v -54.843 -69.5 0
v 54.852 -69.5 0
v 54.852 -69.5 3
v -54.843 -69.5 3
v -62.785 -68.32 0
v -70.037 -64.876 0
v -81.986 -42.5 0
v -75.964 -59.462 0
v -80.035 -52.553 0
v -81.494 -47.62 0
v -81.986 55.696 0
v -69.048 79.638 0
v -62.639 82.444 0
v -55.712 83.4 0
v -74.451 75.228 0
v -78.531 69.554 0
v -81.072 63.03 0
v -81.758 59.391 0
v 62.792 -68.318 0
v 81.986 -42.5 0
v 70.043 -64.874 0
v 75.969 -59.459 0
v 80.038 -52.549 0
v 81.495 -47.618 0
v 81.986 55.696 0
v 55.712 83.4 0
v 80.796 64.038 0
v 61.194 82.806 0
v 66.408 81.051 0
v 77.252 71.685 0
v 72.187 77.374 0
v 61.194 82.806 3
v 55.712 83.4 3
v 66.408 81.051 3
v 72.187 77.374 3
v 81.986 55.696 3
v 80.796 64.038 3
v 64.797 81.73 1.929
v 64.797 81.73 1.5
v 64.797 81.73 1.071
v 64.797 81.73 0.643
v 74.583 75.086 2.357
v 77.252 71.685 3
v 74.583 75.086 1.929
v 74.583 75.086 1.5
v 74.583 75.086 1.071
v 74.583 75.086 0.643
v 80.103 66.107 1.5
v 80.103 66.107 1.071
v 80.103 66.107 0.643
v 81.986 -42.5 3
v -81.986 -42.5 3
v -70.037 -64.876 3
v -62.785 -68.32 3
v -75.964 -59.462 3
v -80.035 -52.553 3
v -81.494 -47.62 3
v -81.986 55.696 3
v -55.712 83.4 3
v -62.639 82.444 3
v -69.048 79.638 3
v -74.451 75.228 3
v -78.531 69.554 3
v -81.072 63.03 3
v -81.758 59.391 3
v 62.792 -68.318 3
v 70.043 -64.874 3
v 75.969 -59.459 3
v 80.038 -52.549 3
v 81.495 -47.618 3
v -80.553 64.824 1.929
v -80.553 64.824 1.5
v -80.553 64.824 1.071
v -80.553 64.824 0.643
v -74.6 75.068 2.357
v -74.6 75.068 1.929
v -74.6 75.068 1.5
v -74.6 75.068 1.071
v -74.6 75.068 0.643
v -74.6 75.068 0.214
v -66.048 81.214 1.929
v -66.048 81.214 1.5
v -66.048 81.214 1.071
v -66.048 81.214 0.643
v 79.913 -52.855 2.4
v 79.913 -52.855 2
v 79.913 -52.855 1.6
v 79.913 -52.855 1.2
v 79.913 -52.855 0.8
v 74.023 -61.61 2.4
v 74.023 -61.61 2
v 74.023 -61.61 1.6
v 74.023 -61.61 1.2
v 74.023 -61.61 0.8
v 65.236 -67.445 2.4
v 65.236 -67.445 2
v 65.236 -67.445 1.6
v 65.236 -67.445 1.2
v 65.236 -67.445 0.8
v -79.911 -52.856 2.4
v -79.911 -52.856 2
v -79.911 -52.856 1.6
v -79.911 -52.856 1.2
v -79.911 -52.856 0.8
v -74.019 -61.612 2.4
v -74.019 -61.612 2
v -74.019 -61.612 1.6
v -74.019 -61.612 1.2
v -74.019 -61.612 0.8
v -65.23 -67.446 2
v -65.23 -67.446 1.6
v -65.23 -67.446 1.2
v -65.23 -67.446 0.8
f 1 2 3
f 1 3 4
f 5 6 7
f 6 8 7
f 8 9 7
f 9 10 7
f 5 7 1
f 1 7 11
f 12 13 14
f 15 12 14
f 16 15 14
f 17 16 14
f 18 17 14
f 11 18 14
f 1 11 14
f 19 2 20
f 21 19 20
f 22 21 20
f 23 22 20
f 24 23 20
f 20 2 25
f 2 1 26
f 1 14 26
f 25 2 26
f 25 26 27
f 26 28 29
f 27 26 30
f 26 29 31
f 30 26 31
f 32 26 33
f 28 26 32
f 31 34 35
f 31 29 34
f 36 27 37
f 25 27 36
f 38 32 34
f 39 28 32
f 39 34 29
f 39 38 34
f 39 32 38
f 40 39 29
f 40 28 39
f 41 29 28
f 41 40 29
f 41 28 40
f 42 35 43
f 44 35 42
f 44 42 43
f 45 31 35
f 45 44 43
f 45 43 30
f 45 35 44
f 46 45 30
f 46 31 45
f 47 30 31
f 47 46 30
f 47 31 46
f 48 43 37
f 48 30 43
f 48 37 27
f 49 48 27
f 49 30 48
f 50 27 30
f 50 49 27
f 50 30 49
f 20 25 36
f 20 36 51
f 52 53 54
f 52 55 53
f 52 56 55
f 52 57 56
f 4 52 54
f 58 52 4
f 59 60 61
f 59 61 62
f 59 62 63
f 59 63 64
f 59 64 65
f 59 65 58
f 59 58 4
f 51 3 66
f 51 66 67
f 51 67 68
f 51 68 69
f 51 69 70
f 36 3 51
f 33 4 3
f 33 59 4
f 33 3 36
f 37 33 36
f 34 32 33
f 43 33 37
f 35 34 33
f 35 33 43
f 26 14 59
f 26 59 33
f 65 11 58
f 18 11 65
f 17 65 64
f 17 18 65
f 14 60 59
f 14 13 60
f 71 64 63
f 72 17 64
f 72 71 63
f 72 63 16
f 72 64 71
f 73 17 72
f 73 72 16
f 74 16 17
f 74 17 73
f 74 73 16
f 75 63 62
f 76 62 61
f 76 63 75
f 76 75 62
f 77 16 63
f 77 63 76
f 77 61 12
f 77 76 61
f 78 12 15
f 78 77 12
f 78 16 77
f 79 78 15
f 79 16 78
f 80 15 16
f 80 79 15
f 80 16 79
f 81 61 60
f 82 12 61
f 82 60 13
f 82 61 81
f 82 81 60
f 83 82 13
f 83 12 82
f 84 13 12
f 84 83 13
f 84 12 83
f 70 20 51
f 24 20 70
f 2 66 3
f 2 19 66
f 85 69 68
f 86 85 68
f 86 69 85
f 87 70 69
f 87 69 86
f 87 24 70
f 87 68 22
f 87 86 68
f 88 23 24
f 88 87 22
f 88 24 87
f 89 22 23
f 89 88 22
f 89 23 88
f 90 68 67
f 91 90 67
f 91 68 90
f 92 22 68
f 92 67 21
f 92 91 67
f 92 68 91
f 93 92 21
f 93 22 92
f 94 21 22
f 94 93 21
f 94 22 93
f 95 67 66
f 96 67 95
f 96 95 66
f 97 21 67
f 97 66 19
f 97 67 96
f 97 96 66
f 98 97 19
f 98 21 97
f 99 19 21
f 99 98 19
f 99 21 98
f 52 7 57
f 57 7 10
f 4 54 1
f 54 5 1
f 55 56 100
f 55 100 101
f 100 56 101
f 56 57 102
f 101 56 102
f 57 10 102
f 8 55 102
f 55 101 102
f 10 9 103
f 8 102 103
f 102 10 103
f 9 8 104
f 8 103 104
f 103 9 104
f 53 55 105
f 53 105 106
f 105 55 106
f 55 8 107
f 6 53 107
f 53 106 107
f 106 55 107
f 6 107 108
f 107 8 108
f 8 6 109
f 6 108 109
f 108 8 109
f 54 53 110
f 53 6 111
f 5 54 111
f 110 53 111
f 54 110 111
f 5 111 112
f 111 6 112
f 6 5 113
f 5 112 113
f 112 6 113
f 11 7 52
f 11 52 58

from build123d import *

# Parameters (mm, degrees)
SKETCH1_W               = 208.77467438
SKETCH1_H               = 197.406670985
BOSS_EXTRUDE1_DEPTH     = 3
CUT_EXTRUDE1_DEPTH      = 164.40940796
CUT_EXTRUDE1_DEPTH_BACK = 164.40940796
SKETCH3_OUTSIDE_W       = 268.242
SKETCH3_OUTSIDE_H       = 256.875


with BuildPart() as part:
    # Sketch1 → Boss-Extrude1 (new body)
    with BuildSketch(Plane.XY):
        with Locations((-0.931028509, 26.203335493)):
            Rectangle(SKETCH1_W, SKETCH1_H)
    extrude(amount=BOSS_EXTRUDE1_DEPTH)

    # Sketch3 outside → Cut-Extrude1 (cut, two sides: drawn at the far end of the back side and taken through both)
    with BuildSketch(Plane.XY.offset(3).offset(-CUT_EXTRUDE1_DEPTH_BACK)):
        with Locations((-0.931, 26.2035)):
            Rectangle(SKETCH3_OUTSIDE_W, SKETCH3_OUTSIDE_H)
        with BuildLine():
            Line((-81.985928335, -42.5), (-81.985928335, 55.696425663))
            add(Edge.make_bspline(
                [(-81.985928335, 55.696425663), (-81.985928335, 57.480534677), (-81.828701176, 59.238428606), (-81.362703019, 61.836894473), (-81.168655213, 62.696594648), (-80.817659424, 63.976153538), (-80.690657051, 64.401005201), (-80.416120483, 65.247285176), (-80.268341823, 65.669201948), (-79.485311166, 67.74790183), (-78.713759279, 69.329933851), (-77.337651642, 71.580982924), (-76.842253677, 72.310870019), (-75.774816372, 73.727906406), (-75.200545054, 74.416732357), (-73.399650263, 76.369557228), (-72.084874818, 77.537197895), (-69.938884948, 79.084287147), (-69.193659576, 79.566114694), (-67.644825986, 80.455903449), (-66.854202021, 80.856496815), (-64.435175535, 81.929383584), (-62.76006993, 82.474017815), (-60.586090646, 82.935871053), (-60.146240413, 83.017331265), (-59.264963373, 83.156629561), (-58.823290579, 83.214583953), (-57.495197363, 83.353679385), (-56.605709599, 83.400137351), (-55.712113128, 83.400137351)],
                knots=[0, 0, 0, 0, 0.125, 0.125, 0.1875, 0.1875, 0.21875, 0.21875, 0.25, 0.25, 0.375, 0.375, 0.4375, 0.4375, 0.5, 0.5, 0.625, 0.625, 0.6875, 0.6875, 0.75, 0.75, 0.875, 0.875, 0.90625, 0.90625, 0.9375, 0.9375, 1, 1, 1, 1], degree=3))
            Line((-55.712113128, 83.400137351), (55.712113128, 83.400137351))
            add(Edge.make_bspline(
                [(55.712113128, 83.400137351), (57.497242838, 83.400137351), (59.251060991, 83.216089045), (61.836179278, 82.671928723), (62.690228593, 82.445535646), (63.959478786, 82.036446245), (64.38147595, 81.888081723), (65.212077414, 81.571329483), (65.621681438, 81.402672573), (67.641787253, 80.509011364), (69.169338506, 79.634307087), (71.328904651, 78.084463437), (72.029153614, 77.525182809), (73.355882665, 76.35032325), (74.61576323, 75.115096033), (75.746300865, 73.76306543), (76.545945736, 72.705462674), (76.804437526, 72.345652984), (77.30518303, 71.611369777), (77.547868028, 71.236112589), (78.709005613, 69.341527304), (79.480407253, 67.756774461), (80.414952122, 65.282029433), (80.68910641, 64.440727699), (81.161932034, 62.725016727), (81.358808241, 61.856167244), (81.828919146, 59.242044526), (81.985928335, 57.47928148), (81.985928335, 55.696425663)],
                knots=[0, 0, 0, 0, 0.125, 0.125, 0.1875, 0.1875, 0.21875, 0.21875, 0.25, 0.25, 0.375, 0.375, 0.4375, 0.4375, 0.5, 0.5625, 0.5625, 0.59375, 0.59375, 0.625, 0.625, 0.75, 0.75, 0.8125, 0.8125, 0.875, 0.875, 1, 1, 1, 1], degree=3))
            Line((81.985928335, 55.696425663), (81.985928335, -42.5))
            add(Edge.make_bspline(
                [(81.985928335, -42.5), (81.986203644, -44.287285237), (81.809901717, -46.044499409), (81.291534566, -48.637079121), (81.076109979, -49.494011536), (80.558046439, -51.193023778), (80.25407127, -52.037011955), (79.230272052, -54.491245533), (78.395084715, -56.042839053), (77.162096296, -57.877633011), (76.905963129, -58.23930967), (76.374323181, -58.951931073), (76.098001775, -59.303830549), (75.246547421, -60.334465254), (74.64927886, -60.988355507), (72.771357993, -62.853544286), (71.405402717, -63.969270823), (69.552101326, -65.200512974), (69.173205674, -65.438989032), (68.408349501, -65.894477816), (68.021689437, -66.1120138), (66.849244821, -66.734554973), (65.252805428, -67.484573056), (63.590991588, -68.076894408), (62.319780084, -68.461189354), (61.891893773, -68.579279078), (61.02767473, -68.795084), (60.590982473, -68.892814069), (58.406172049, -69.325774201), (56.638810883, -69.499728058), (54.851793425, -69.5)],
                knots=[0, 0, 0, 0, 0.125, 0.125, 0.1875, 0.1875, 0.25, 0.25, 0.375, 0.375, 0.40625, 0.40625, 0.4375, 0.4375, 0.5, 0.5, 0.625, 0.625, 0.65625, 0.65625, 0.6875, 0.6875, 0.75, 0.8125, 0.8125, 0.84375, 0.84375, 0.875, 0.875, 1, 1, 1, 1], degree=3))
            Line((54.851793425, -69.5), (-54.843453461, -69.5))
            add(Edge.make_bspline(
                [(-81.985928335, -42.5), (-81.985928335, -44.287558655), (-81.809328529, -46.04501477), (-81.290482101, -48.637912138), (-81.074892306, -49.494942838), (-80.5564872, -51.194136105), (-80.252335175, -52.03820711), (-79.228000127, -54.492660255), (-78.39244508, -56.044363985), (-77.158984035, -57.879250925), (-76.902755688, -58.240943921), (-76.370924048, -58.953593408), (-76.094505857, -59.305504654), (-75.242761547, -60.336167409), (-74.645300231, -60.990066774), (-72.766802697, -62.855255026), (-71.40046509, -63.970944322), (-69.54668849, -65.202092726), (-69.167697725, -65.440547593), (-68.402653545, -65.895989636), (-68.015900398, -66.113500043), (-66.843179244, -66.735957991), (-65.246378354, -67.485847817), (-63.584217239, -68.07800684), (-62.312750686, -68.462167088), (-61.884780262, -68.580209751), (-61.020394829, -68.795916147), (-60.583620238, -68.8935947), (-58.398406517, -69.326288528), (-56.630746271, -69.5), (-54.843453461, -69.5)],
                knots=[0, 0, 0, 0, 0.125, 0.125, 0.1875, 0.1875, 0.25, 0.25, 0.375, 0.375, 0.40625, 0.40625, 0.4375, 0.4375, 0.5, 0.5, 0.625, 0.625, 0.65625, 0.65625, 0.6875, 0.6875, 0.75, 0.8125, 0.8125, 0.84375, 0.84375, 0.875, 0.875, 1, 1, 1, 1], degree=3))
        make_face(mode=Mode.SUBTRACT)
    extrude(amount=CUT_EXTRUDE1_DEPTH + CUT_EXTRUDE1_DEPTH_BACK, mode=Mode.SUBTRACT)


solid = part.part
